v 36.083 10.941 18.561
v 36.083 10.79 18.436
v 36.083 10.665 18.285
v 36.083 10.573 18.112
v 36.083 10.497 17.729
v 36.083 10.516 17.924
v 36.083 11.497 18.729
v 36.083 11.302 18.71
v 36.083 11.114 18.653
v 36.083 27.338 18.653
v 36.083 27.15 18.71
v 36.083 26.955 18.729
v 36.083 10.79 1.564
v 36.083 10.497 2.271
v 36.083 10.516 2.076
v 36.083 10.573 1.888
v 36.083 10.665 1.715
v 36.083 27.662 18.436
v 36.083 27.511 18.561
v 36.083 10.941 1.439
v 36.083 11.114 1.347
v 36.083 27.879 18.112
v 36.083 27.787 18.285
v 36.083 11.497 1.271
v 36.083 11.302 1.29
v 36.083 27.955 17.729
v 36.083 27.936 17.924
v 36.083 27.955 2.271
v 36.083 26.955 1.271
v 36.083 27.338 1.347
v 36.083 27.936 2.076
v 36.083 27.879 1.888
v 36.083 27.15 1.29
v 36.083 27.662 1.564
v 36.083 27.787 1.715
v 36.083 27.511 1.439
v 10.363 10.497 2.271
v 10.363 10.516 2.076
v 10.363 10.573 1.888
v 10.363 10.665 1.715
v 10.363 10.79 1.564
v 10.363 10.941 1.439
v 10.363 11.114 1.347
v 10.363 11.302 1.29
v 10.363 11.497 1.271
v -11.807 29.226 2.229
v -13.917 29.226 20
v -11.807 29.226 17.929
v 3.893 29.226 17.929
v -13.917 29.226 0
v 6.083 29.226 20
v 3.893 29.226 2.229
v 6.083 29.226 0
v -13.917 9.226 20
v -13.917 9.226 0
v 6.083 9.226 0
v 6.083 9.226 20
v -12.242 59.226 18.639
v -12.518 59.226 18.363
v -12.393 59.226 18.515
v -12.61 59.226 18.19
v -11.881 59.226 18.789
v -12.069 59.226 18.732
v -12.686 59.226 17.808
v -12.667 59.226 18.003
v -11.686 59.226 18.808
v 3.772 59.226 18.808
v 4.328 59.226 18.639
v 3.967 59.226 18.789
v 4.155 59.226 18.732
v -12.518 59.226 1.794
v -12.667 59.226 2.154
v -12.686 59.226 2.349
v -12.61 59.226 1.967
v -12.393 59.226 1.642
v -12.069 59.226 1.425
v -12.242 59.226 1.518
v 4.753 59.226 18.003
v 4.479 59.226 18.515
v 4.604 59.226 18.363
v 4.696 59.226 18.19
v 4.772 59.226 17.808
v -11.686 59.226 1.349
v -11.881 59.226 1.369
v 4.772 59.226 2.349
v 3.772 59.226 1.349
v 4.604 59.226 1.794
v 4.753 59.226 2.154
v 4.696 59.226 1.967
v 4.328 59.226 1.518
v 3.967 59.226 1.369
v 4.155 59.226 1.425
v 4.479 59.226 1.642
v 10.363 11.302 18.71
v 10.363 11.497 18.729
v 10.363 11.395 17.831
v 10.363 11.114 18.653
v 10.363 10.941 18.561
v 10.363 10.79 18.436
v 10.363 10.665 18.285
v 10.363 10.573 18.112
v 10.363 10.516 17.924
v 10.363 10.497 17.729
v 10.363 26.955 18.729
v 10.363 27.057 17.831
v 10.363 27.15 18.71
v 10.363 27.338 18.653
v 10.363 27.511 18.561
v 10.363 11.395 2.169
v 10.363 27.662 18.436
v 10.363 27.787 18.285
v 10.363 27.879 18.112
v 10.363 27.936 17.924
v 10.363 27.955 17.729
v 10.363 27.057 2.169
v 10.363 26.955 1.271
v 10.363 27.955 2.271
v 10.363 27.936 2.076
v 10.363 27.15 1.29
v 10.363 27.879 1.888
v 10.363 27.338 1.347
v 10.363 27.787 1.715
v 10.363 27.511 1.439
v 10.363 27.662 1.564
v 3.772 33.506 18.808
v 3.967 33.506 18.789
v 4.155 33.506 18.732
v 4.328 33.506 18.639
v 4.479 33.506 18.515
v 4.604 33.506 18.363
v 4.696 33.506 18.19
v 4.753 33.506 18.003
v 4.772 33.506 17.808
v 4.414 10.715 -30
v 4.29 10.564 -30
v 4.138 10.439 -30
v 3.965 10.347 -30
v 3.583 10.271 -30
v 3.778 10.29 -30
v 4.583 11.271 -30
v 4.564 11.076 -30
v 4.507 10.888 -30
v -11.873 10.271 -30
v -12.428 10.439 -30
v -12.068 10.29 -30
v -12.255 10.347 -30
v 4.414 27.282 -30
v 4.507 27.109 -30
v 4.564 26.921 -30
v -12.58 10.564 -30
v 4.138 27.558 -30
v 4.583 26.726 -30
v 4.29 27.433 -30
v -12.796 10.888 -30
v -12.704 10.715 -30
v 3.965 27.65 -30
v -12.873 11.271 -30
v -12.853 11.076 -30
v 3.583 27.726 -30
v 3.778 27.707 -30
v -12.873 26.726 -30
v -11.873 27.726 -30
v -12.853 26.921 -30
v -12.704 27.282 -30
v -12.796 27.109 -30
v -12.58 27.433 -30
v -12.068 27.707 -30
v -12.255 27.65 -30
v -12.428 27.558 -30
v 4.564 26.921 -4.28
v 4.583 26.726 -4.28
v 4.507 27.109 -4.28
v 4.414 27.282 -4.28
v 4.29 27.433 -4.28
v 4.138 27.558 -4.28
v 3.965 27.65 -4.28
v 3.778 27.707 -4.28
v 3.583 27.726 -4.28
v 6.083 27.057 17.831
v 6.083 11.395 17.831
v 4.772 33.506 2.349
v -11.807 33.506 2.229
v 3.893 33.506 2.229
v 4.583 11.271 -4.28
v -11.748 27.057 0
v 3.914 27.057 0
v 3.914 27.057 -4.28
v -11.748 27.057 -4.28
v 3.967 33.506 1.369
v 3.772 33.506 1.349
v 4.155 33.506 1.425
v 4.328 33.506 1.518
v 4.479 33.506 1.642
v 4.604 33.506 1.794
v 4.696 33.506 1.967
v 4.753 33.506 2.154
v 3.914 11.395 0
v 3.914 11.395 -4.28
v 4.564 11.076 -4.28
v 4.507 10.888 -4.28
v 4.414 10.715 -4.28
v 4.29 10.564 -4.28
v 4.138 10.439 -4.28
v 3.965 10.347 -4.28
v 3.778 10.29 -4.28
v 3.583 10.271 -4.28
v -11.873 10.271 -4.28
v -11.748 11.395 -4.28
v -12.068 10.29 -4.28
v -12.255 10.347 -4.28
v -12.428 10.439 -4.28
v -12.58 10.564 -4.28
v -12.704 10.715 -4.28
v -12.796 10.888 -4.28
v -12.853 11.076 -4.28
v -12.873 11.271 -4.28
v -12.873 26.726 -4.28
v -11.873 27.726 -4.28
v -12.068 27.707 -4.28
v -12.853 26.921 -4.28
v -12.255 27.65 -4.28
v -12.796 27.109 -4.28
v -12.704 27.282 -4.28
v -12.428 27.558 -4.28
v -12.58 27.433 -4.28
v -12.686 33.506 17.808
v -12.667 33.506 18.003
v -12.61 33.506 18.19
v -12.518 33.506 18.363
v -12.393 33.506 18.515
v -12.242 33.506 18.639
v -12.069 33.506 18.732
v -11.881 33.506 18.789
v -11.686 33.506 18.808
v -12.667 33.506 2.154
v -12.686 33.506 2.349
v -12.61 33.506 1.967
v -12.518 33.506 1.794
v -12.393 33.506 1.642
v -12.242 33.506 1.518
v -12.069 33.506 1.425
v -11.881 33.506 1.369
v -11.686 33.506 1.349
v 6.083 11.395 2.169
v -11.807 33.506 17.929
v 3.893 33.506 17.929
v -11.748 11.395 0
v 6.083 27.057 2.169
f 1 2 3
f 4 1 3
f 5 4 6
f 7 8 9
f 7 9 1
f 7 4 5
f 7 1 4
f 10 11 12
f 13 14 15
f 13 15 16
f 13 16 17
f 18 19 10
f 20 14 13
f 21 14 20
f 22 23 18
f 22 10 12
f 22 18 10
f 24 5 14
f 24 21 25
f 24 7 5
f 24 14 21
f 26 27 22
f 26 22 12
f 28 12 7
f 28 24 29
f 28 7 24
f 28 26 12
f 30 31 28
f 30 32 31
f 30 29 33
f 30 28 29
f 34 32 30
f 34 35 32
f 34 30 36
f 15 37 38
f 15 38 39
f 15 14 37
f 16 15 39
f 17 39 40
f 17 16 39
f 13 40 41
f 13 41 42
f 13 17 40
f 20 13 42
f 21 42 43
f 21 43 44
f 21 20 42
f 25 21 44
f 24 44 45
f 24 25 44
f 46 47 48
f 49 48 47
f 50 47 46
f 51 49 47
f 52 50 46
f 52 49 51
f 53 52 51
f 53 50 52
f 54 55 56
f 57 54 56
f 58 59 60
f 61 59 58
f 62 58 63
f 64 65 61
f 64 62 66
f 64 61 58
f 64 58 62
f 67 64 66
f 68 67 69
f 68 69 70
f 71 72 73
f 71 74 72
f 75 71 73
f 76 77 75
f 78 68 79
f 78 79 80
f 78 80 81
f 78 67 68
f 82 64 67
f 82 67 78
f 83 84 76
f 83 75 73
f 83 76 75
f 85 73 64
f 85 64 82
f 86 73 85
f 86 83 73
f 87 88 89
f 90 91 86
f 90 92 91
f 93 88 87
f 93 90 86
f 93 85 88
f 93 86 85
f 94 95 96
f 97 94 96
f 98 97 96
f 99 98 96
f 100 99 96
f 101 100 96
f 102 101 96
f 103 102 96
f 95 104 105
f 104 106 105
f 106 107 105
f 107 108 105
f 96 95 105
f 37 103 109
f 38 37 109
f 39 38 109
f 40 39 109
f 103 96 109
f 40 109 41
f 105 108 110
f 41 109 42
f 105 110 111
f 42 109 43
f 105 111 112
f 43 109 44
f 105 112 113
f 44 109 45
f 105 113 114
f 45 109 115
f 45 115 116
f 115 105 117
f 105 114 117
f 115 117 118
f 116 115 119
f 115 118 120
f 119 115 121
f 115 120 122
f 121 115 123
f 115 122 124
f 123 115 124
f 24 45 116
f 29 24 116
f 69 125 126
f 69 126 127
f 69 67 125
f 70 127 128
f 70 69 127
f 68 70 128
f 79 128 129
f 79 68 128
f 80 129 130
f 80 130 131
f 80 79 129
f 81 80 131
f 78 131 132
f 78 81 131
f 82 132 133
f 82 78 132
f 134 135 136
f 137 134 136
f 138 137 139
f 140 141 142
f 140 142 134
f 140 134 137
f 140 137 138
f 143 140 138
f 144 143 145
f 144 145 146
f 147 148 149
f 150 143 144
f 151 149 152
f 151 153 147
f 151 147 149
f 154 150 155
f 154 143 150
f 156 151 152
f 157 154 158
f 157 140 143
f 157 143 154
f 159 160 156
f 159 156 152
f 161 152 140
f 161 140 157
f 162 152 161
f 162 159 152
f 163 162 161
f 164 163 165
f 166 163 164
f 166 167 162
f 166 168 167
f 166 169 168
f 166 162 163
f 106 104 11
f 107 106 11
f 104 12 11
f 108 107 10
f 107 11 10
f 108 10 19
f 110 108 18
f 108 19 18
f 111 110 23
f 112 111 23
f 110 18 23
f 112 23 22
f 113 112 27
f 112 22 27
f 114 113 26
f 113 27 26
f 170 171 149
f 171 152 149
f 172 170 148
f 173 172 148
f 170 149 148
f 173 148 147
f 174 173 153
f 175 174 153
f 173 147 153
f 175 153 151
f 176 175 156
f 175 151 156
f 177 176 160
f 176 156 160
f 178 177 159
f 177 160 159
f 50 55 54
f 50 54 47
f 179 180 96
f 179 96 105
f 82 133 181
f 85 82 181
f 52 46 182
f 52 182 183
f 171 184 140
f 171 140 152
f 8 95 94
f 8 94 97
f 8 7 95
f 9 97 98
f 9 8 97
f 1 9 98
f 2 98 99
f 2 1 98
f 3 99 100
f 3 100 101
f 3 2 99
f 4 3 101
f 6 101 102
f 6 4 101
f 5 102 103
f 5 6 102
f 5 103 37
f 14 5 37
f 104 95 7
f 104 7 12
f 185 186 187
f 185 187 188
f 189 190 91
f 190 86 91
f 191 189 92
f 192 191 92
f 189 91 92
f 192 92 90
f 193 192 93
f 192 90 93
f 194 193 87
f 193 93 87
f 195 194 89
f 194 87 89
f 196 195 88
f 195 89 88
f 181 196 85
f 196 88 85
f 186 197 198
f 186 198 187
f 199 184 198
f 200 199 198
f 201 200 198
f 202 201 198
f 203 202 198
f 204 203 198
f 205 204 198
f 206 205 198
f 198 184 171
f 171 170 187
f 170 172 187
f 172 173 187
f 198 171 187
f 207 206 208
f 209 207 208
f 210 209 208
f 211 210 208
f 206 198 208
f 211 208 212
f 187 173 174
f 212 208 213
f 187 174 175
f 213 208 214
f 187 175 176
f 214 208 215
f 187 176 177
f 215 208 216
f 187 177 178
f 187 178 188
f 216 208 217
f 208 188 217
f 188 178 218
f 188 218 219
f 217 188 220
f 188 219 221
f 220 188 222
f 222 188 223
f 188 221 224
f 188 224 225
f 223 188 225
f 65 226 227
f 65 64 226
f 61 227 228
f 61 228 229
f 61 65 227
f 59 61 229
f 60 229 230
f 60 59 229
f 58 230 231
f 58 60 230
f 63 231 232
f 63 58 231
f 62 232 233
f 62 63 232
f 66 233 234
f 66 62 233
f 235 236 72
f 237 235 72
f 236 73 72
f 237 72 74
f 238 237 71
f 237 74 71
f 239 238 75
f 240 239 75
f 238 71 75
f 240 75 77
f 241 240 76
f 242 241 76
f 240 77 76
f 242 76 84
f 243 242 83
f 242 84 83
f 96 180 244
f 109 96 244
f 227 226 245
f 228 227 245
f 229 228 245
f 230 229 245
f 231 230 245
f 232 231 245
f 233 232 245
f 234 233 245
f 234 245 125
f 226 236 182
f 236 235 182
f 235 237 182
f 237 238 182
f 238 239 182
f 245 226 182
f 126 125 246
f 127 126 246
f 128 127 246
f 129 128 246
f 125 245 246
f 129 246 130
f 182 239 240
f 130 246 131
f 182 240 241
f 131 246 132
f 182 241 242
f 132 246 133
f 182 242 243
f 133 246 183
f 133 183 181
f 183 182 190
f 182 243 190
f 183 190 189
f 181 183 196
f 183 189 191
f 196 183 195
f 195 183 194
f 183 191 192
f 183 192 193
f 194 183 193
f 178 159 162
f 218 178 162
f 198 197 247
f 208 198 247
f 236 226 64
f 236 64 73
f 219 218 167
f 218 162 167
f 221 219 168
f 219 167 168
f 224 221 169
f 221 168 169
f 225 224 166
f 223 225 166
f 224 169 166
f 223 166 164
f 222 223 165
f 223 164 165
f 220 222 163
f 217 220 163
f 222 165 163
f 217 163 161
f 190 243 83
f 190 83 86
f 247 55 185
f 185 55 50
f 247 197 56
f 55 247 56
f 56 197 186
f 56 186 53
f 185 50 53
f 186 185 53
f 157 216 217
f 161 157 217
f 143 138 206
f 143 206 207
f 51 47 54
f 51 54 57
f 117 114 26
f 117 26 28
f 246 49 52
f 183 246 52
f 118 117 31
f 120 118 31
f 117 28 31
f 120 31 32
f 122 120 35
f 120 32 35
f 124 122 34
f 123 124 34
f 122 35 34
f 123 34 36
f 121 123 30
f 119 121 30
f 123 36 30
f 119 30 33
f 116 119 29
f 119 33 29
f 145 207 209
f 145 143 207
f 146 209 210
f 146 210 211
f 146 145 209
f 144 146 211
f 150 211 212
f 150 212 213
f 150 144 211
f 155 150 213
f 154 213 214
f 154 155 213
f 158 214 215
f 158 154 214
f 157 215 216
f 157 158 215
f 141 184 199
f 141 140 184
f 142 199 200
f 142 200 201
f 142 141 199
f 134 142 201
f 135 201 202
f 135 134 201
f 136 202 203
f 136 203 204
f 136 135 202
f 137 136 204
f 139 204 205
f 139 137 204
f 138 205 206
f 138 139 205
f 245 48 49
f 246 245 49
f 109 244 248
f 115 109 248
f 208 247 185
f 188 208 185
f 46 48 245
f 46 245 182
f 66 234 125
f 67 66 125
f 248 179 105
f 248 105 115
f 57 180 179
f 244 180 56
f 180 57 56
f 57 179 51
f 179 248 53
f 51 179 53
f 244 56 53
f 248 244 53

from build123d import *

# Parameters (mm, degrees)
SZKIC1_W                    = 20
SZKIC1_H                    = 20
DODANIE_WYCI_GNI_CIE1_DEPTH = 20
SZKIC2_W                    = 15.7
SZKIC2_H                    = 15.7
DODANIE_WYCI_GNI_CIE2_DEPTH = 4.28
SZKIC3_W                    = 15.662415204
SZKIC3_H                    = 15.662415203
DODANIE_WYCI_GNI_CIE3_DEPTH = 4.28
SZKIC4_W                    = 15.662415203
SZKIC4_H                    = 15.662415203
DODANIE_WYCI_GNI_CIE4_DEPTH = 4.28
SZKIC5_W                    = 17.455323011
SZKIC5_H                    = 17.455323012
DODANIE_WYCI_GNI_CIE5_DEPTH = 25.72
SZKIC6_W                    = 17.458466428
SZKIC6_H                    = 17.458466428
DODANIE_WYCI_GNI_CIE6_DEPTH = 25.72
SZKIC7_W                    = 17.458466427
SZKIC7_H                    = 17.458466428
DODANIE_WYCI_GNI_CIE7_DEPTH = 25.72
ZAOKR_GLENIE2_R             = 1


with BuildPart() as part:
    # Szkic1 → Dodanie-wyciągnięcie1 (new body)
    with BuildSketch(Plane.XY):
        with Locations((-3.917212592, 19.226146443)):
            Rectangle(SZKIC1_W, SZKIC1_H)
    extrude(amount=DODANIE_WYCI_GNI_CIE1_DEPTH)

    # Szkic2 → Dodanie-wyciągnięcie2 (add)
    with BuildSketch(Plane(origin=(0, 29.226146443, 0), x_dir=(1, 0, 0), z_dir=(0, 1, 0))):
        with Locations((-3.957055084, -10.078566334)):
            Rectangle(SZKIC2_W, SZKIC2_H)
    extrude(amount=DODANIE_WYCI_GNI_CIE2_DEPTH)

    # Szkic3 → Dodanie-wyciągnięcie3 (add)
    with BuildSketch(Plane(origin=(6.082787408, 0, 0), x_dir=(0, 0, -1), z_dir=(1, 0, 0))):
        with Locations((-10, 19.226146442)):
            Rectangle(SZKIC3_W, SZKIC3_H)
    extrude(amount=DODANIE_WYCI_GNI_CIE3_DEPTH)

    # Szkic4 → Dodanie-wyciągnięcie4 (add)
    with BuildSketch(Plane(origin=(0, 0, 0), x_dir=(-1, 0, 0), z_dir=(0, 0, -1))):
        with Locations((3.917212592, 19.226146442)):
            Rectangle(SZKIC4_W, SZKIC4_H)
    extrude(amount=DODANIE_WYCI_GNI_CIE4_DEPTH)

    # Szkic5 → Dodanie-wyciągnięcie5 (add)
    with BuildSketch(Plane(origin=(0, 0, -4.28), x_dir=(-1, 0, 0), z_dir=(0, 0, -1))):
        with Locations((4.144874098, 18.998484937)):
            Rectangle(SZKIC5_W, SZKIC5_H)
    extrude(amount=DODANIE_WYCI_GNI_CIE5_DEPTH)

    # Szkic6 → Dodanie-wyciągnięcie6 (add)
    with BuildSketch(Plane(origin=(10.362787408, 0, 0), x_dir=(0, 0, -1), z_dir=(1, 0, 0))):
        with Locations((-10, 19.226146443)):
            Rectangle(SZKIC6_W, SZKIC6_H)
    extrude(amount=DODANIE_WYCI_GNI_CIE6_DEPTH)

    # Szkic7 → Dodanie-wyciągnięcie7 (add)
    with BuildSketch(Plane(origin=(0, 33.506146443, 0), x_dir=(1, 0, 0), z_dir=(0, 1, 0))):
        with Locations((-3.957055085, -10.078566334)):
            Rectangle(SZKIC7_W, SZKIC7_H)
    extrude(amount=DODANIE_WYCI_GNI_CIE7_DEPTH)

    # Zaokrąglenie2
    zaokr_glenie2_edges = [part.edges().sort_by_distance(p)[0] for p in [
        (4.582787408, 27.726146443, -17.14),
        (4.582787408, 10.270823431, -17.14),
        (-12.872535603, 10.270823431, -17.14),
        (-12.872535603, 27.726146443, -17.14),
        (23.222787408, 10.496913229, 18.729233214),
        (23.222787408, 10.496913229, 1.270766786),
        (23.222787408, 27.955379657, 1.270766786),
        (23.222787408, 27.955379657, 18.729233214),
        (4.772178129, 46.366146443, 18.807799548),
        (4.772178129, 46.366146443, 1.34933312),
        (-12.686288298, 46.366146443, 1.34933312),
        (-12.686288298, 46.366146443, 18.807799548),
    ]]
    fillet(zaokr_glenie2_edges, radius=ZAOKR_GLENIE2_R)


solid = part.part
